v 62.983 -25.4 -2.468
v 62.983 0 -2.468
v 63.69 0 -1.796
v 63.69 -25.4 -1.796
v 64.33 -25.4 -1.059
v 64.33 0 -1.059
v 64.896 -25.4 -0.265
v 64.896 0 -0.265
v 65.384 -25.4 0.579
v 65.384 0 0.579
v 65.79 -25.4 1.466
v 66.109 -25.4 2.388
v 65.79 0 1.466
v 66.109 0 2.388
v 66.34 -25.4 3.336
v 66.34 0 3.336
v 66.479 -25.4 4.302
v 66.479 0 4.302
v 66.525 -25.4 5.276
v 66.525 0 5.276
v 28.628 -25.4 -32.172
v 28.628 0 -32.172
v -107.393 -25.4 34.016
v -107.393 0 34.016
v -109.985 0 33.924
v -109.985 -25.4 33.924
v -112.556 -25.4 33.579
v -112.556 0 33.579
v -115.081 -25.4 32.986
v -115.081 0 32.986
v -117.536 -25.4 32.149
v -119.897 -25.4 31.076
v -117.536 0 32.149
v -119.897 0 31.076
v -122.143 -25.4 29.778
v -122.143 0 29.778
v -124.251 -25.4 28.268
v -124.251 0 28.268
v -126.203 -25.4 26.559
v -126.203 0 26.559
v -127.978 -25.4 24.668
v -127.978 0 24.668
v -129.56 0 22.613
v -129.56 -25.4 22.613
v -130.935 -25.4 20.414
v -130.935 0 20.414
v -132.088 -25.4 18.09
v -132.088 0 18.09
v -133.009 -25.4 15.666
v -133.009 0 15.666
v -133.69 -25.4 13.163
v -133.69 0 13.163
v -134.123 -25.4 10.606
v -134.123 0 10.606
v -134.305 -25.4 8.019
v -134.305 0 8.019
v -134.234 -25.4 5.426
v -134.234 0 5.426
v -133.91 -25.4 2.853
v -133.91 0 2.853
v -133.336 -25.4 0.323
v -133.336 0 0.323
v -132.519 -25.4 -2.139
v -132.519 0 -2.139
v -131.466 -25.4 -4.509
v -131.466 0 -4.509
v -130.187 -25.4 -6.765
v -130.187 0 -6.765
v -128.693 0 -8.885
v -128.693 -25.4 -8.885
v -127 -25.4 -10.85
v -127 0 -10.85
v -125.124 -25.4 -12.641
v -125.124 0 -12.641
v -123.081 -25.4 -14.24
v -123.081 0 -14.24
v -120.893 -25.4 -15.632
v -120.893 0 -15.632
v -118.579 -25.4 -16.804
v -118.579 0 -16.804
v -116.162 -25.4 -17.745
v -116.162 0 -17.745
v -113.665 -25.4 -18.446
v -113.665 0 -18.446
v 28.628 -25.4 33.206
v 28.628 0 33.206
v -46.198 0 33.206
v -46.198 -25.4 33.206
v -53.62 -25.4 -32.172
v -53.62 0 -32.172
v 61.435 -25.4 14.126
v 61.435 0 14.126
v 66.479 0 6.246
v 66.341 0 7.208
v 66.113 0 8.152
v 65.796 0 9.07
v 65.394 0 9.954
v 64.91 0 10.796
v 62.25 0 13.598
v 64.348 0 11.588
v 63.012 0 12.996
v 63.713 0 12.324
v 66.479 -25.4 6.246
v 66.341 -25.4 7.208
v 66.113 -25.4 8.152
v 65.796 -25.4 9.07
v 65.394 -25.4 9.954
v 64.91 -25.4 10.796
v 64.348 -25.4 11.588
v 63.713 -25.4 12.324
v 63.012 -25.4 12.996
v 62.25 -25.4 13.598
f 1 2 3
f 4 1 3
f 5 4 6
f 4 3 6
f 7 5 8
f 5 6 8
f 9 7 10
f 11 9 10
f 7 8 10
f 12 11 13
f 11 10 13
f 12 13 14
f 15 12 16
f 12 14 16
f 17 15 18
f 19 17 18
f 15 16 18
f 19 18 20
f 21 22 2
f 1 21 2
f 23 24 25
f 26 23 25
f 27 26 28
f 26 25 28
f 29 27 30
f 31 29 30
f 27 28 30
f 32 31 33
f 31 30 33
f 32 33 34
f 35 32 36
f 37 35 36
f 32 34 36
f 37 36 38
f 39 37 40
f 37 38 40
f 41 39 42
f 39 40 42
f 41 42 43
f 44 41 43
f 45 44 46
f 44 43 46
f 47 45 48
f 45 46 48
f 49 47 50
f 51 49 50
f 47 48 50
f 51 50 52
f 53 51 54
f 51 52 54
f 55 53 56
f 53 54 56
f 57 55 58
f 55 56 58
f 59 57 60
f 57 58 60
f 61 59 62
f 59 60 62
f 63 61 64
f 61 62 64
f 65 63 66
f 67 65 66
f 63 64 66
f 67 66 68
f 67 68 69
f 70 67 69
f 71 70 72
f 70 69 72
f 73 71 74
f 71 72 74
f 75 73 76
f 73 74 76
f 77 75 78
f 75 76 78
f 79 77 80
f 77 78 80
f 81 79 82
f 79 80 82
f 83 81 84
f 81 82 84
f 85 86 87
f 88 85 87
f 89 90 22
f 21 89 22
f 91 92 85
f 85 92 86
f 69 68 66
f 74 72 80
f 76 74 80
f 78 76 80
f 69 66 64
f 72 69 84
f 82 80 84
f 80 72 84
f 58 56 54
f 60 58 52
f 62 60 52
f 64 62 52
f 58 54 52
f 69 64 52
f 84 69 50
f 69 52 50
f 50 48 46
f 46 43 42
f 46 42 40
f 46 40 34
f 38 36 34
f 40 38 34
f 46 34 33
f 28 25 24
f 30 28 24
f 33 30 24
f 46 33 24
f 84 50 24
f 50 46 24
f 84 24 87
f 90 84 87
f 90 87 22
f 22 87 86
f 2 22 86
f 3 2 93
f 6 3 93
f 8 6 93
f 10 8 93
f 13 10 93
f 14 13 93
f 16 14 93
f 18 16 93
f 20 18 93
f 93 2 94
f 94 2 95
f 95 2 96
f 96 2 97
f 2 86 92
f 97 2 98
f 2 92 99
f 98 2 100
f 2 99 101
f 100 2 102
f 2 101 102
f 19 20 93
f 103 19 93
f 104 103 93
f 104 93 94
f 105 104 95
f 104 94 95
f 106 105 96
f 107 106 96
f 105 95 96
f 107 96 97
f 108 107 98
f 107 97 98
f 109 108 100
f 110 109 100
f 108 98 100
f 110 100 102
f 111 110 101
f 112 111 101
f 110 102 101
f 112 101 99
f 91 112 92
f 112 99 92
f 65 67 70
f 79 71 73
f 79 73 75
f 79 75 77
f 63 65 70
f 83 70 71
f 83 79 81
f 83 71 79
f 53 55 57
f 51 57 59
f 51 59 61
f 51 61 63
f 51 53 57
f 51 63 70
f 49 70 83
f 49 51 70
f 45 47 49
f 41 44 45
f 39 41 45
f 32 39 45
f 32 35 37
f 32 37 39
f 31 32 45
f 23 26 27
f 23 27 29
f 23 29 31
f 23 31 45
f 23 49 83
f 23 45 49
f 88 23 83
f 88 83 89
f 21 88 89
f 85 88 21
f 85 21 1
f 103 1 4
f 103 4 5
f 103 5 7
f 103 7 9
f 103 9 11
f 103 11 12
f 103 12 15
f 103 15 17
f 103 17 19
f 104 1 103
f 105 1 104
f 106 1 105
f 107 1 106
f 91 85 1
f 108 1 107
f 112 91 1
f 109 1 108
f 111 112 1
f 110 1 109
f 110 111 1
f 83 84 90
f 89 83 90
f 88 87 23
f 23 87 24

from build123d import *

# Parameters (mm, degrees)
F1_DEPTH = 25.4


with BuildPart() as f1:
    # F0 (on Front) → F1 (new body)
    with BuildSketch(Plane.XZ):
        with BuildLine():
            ThreePointArc((-113.665045, -18.445694), (-91.184621, -13.32064), (-81.178721, 7.452363))
            ThreePointArc((-81.178721, 7.452363), (-88.835816, 26.112679), (-107.393124, 34.016147))
            ThreePointArc((-107.393124, 34.016147), (-134.123105, 10.60594), (-113.665045, -18.445694))
        make_face()
        with BuildLine():
            ThreePointArc((-107.393124, 34.016147), (-88.835816, 26.112679), (-81.178721, 7.452363))
            ThreePointArc((-81.178721, 7.452363), (-91.184621, -13.32064), (-113.665045, -18.445694))
            Line((-113.665045, -18.445694), (-53.619757, -32.171853))
            Line((-53.619757, -32.171853), (-53.619757, 33.205918))
            Line((-53.619757, 33.205918), (-46.198466, 33.205918))
            Line((-46.198466, 33.205918), (-107.393124, 34.016147))
        make_face()
        Polygon((28.628288, 33.205918), (-46.198466, 33.205918), (-53.619757, 33.205918), (-53.619757, -32.171853), (28.628288, -32.171853), align=None)
        with BuildLine():
            Line((61.43455, 14.125688), (28.628288, 33.205918))
            Line((28.628288, 33.205918), (28.628288, -32.171853))
            Line((28.628288, -32.171853), (62.983333, -2.468457))
            ThreePointArc((62.983333, -2.468457), (46.094147, 4.324571), (61.43455, 14.125688))
        make_face()
        with BuildLine():
            ThreePointArc((66.525181, 5.27595), (65.161731, 10.380663), (61.43455, 14.125688))
            ThreePointArc((61.43455, 14.125688), (46.094147, 4.324571), (62.983333, -2.468457))
            ThreePointArc((62.983333, -2.468457), (65.597707, 1.018), (66.525181, 5.27595))
        make_face()
    extrude(amount=F1_DEPTH)


solid = f1.part
